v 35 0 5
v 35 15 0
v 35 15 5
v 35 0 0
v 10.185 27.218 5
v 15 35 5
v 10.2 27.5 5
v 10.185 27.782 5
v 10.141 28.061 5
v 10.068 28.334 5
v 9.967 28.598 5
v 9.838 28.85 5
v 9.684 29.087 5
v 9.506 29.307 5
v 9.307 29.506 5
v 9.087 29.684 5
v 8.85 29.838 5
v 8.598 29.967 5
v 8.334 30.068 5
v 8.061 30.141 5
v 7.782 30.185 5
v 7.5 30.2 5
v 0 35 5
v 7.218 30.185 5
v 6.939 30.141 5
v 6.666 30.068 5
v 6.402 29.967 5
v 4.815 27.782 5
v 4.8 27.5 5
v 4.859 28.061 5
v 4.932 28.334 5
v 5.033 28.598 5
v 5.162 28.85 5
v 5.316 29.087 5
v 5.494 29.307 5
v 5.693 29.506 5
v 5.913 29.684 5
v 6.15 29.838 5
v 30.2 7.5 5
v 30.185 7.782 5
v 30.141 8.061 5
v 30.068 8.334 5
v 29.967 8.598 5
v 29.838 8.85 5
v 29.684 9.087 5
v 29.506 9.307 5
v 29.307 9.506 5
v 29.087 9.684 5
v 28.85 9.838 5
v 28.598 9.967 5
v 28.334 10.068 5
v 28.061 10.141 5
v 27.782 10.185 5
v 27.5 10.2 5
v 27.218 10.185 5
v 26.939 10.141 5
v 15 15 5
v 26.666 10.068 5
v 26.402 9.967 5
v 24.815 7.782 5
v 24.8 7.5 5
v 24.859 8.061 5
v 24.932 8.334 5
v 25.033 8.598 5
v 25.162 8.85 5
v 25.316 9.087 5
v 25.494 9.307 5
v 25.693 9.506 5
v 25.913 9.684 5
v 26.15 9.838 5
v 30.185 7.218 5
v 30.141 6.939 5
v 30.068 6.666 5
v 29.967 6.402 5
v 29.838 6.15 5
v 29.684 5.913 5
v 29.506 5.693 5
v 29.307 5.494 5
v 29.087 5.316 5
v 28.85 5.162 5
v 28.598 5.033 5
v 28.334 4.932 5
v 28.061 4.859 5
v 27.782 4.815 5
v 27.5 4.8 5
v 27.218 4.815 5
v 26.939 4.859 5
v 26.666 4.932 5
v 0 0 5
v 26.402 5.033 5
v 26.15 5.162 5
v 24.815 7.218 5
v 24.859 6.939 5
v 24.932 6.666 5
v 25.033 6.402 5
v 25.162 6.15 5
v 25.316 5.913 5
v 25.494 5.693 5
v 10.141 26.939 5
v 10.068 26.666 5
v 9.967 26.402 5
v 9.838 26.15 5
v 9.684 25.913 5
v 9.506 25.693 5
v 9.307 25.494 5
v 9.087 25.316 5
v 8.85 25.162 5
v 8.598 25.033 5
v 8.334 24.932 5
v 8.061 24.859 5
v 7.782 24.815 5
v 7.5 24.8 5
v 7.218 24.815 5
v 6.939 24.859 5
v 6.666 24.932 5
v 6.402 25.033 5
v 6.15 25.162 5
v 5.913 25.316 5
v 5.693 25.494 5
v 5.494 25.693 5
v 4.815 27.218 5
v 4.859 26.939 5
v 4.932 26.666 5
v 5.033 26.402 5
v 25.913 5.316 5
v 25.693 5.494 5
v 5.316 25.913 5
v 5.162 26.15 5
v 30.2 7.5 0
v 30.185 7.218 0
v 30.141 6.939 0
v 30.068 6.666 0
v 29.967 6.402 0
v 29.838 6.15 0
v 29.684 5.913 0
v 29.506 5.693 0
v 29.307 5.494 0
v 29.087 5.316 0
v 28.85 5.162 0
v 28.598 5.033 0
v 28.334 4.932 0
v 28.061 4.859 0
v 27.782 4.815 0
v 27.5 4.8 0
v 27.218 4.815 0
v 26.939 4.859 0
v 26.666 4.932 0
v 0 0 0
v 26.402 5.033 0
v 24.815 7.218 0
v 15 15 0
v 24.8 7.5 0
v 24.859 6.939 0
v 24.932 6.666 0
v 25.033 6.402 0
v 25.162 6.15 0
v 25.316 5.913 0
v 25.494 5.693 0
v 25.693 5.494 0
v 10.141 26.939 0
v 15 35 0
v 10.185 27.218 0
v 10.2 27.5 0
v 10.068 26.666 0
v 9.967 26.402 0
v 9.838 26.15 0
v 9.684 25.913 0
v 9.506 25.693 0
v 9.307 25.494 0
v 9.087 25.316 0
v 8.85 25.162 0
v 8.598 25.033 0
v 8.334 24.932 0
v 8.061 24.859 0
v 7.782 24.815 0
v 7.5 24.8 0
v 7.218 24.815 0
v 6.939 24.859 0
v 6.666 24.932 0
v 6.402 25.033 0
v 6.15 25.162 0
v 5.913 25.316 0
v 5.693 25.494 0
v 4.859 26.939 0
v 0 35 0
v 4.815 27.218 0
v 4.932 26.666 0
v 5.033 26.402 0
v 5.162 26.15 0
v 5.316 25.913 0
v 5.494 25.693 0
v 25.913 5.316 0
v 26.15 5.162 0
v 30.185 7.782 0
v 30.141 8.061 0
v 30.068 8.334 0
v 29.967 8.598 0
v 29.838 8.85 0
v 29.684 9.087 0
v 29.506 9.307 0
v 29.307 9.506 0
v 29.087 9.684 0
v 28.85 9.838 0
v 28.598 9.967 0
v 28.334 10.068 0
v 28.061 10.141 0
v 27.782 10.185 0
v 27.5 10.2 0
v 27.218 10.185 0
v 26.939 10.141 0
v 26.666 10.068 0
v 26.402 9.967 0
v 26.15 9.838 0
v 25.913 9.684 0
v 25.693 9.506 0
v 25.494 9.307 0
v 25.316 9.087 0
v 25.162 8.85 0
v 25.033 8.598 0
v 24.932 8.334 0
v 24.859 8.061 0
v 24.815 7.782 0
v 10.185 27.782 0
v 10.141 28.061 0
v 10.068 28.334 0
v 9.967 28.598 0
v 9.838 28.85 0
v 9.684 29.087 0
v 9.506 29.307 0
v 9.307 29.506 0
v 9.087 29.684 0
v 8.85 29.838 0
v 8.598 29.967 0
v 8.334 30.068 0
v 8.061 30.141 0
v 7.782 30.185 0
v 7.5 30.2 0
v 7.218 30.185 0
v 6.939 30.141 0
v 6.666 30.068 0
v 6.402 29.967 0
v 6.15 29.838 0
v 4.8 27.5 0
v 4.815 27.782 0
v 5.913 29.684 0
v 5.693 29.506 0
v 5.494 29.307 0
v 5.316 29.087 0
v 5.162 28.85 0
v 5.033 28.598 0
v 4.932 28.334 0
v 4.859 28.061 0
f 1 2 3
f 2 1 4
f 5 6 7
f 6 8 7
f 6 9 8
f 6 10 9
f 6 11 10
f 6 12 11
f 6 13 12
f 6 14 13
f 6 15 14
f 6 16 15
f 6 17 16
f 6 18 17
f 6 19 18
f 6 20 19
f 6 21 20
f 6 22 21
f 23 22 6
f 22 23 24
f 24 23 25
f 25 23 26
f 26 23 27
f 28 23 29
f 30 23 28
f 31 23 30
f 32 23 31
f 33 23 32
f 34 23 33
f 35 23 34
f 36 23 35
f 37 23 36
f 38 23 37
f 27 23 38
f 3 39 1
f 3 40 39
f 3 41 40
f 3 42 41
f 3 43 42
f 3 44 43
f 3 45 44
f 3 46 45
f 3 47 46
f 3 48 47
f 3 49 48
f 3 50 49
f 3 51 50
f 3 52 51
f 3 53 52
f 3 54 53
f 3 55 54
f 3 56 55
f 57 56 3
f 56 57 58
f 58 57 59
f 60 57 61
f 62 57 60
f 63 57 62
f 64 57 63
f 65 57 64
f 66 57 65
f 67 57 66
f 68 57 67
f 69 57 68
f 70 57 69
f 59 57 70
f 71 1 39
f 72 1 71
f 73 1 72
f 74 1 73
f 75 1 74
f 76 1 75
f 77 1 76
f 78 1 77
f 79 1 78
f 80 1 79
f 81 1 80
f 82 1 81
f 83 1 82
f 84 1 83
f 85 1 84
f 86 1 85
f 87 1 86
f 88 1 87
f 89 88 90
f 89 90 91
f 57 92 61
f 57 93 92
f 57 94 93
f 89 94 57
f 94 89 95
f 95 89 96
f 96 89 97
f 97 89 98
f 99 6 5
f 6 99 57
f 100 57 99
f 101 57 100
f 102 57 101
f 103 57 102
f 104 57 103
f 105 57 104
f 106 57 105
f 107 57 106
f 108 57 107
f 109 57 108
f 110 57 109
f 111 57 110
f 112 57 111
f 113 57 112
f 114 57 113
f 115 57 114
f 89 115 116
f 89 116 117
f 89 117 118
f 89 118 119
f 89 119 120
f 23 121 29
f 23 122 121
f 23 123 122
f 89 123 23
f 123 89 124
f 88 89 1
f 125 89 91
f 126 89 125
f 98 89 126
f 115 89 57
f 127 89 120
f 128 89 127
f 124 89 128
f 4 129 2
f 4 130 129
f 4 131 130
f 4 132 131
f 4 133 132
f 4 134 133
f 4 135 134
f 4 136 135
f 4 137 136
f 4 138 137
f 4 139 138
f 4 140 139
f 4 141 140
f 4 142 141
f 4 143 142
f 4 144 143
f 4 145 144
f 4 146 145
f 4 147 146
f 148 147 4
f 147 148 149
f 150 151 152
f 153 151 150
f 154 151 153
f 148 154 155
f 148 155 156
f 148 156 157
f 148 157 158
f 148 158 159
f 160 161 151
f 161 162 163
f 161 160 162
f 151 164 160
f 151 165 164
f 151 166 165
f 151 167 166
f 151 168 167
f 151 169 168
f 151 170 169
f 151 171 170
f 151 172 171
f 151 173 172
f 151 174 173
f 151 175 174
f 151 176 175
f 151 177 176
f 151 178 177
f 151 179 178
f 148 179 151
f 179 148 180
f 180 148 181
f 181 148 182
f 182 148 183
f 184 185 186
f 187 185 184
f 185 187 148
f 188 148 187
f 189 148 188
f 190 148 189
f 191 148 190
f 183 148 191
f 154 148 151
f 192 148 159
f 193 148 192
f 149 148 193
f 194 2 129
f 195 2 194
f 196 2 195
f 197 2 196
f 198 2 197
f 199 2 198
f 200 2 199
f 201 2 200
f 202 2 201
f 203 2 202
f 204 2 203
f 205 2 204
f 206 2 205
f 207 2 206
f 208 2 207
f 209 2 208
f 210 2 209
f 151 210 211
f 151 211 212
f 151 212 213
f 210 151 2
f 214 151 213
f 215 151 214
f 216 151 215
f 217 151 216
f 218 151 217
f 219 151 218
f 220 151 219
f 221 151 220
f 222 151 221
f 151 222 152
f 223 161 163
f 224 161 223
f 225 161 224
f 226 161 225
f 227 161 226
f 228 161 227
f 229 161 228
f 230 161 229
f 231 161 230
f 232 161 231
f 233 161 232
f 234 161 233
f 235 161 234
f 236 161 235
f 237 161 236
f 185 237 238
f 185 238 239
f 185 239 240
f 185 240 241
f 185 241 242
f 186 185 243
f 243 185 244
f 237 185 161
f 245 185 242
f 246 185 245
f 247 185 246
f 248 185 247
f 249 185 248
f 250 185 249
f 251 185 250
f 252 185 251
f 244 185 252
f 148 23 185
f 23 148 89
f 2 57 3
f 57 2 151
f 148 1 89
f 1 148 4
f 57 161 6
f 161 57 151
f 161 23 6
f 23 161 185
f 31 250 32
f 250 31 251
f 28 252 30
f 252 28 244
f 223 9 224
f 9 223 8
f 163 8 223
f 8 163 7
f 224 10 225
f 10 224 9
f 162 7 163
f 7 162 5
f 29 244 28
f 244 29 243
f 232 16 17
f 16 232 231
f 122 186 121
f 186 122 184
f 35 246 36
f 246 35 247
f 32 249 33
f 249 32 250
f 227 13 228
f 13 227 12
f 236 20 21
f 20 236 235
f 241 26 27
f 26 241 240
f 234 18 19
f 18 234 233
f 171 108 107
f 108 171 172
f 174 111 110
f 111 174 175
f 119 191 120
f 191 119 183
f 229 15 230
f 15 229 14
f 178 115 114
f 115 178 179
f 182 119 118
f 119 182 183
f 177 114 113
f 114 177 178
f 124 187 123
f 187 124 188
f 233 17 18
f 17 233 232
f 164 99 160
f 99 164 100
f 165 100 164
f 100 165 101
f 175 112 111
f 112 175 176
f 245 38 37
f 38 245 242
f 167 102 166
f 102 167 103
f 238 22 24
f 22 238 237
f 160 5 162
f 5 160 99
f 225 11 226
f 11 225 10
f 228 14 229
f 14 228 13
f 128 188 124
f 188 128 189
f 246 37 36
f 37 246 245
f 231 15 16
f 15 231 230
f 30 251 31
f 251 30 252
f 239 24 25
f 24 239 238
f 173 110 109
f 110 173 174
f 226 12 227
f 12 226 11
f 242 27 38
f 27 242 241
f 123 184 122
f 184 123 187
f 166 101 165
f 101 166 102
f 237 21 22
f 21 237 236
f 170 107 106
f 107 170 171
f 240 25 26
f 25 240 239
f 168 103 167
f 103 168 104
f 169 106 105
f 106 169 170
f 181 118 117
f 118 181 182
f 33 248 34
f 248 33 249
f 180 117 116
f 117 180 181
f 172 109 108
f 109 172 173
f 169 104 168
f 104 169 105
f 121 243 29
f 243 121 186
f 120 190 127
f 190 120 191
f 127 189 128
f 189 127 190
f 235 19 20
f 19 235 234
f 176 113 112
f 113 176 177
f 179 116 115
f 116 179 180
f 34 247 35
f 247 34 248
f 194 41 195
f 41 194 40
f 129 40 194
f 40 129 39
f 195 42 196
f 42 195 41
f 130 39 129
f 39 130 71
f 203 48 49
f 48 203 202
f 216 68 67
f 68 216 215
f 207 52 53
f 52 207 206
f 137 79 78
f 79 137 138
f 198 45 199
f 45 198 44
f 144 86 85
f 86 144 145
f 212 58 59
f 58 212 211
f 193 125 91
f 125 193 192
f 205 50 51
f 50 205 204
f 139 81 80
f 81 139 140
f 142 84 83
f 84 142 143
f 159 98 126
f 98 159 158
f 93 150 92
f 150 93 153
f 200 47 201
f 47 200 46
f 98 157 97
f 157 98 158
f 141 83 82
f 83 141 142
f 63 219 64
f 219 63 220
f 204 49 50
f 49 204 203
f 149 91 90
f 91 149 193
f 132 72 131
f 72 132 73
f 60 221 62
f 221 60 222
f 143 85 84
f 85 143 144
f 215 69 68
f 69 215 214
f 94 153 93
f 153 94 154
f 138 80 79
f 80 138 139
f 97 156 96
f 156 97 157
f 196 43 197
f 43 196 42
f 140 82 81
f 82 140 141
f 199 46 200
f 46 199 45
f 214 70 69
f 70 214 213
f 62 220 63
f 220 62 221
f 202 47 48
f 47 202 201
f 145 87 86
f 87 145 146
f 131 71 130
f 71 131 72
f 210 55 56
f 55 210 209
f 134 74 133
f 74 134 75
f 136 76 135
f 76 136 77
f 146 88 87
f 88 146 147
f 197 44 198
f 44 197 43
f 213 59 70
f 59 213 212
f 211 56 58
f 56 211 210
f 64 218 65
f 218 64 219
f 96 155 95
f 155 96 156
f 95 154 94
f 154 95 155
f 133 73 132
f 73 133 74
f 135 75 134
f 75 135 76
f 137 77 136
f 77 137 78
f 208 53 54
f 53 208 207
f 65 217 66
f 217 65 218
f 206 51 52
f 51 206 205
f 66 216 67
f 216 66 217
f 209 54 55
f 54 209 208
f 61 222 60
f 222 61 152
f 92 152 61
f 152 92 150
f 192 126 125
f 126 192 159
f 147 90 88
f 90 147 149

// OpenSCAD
// V-slot corner connector.
$fn = 60;
eps = 0.02;
profile = 15;
arm = 35;
plate_t = 5;
difference() {
    union() { cube([arm,profile,plate_t]); cube([profile,arm,plate_t]); }
    for (p=[[profile/2,arm-profile/2],[arm-profile/2,profile/2]]) translate([p[0],p[1],-eps]) cylinder(d=5.4,h=plate_t+2*eps);
}
